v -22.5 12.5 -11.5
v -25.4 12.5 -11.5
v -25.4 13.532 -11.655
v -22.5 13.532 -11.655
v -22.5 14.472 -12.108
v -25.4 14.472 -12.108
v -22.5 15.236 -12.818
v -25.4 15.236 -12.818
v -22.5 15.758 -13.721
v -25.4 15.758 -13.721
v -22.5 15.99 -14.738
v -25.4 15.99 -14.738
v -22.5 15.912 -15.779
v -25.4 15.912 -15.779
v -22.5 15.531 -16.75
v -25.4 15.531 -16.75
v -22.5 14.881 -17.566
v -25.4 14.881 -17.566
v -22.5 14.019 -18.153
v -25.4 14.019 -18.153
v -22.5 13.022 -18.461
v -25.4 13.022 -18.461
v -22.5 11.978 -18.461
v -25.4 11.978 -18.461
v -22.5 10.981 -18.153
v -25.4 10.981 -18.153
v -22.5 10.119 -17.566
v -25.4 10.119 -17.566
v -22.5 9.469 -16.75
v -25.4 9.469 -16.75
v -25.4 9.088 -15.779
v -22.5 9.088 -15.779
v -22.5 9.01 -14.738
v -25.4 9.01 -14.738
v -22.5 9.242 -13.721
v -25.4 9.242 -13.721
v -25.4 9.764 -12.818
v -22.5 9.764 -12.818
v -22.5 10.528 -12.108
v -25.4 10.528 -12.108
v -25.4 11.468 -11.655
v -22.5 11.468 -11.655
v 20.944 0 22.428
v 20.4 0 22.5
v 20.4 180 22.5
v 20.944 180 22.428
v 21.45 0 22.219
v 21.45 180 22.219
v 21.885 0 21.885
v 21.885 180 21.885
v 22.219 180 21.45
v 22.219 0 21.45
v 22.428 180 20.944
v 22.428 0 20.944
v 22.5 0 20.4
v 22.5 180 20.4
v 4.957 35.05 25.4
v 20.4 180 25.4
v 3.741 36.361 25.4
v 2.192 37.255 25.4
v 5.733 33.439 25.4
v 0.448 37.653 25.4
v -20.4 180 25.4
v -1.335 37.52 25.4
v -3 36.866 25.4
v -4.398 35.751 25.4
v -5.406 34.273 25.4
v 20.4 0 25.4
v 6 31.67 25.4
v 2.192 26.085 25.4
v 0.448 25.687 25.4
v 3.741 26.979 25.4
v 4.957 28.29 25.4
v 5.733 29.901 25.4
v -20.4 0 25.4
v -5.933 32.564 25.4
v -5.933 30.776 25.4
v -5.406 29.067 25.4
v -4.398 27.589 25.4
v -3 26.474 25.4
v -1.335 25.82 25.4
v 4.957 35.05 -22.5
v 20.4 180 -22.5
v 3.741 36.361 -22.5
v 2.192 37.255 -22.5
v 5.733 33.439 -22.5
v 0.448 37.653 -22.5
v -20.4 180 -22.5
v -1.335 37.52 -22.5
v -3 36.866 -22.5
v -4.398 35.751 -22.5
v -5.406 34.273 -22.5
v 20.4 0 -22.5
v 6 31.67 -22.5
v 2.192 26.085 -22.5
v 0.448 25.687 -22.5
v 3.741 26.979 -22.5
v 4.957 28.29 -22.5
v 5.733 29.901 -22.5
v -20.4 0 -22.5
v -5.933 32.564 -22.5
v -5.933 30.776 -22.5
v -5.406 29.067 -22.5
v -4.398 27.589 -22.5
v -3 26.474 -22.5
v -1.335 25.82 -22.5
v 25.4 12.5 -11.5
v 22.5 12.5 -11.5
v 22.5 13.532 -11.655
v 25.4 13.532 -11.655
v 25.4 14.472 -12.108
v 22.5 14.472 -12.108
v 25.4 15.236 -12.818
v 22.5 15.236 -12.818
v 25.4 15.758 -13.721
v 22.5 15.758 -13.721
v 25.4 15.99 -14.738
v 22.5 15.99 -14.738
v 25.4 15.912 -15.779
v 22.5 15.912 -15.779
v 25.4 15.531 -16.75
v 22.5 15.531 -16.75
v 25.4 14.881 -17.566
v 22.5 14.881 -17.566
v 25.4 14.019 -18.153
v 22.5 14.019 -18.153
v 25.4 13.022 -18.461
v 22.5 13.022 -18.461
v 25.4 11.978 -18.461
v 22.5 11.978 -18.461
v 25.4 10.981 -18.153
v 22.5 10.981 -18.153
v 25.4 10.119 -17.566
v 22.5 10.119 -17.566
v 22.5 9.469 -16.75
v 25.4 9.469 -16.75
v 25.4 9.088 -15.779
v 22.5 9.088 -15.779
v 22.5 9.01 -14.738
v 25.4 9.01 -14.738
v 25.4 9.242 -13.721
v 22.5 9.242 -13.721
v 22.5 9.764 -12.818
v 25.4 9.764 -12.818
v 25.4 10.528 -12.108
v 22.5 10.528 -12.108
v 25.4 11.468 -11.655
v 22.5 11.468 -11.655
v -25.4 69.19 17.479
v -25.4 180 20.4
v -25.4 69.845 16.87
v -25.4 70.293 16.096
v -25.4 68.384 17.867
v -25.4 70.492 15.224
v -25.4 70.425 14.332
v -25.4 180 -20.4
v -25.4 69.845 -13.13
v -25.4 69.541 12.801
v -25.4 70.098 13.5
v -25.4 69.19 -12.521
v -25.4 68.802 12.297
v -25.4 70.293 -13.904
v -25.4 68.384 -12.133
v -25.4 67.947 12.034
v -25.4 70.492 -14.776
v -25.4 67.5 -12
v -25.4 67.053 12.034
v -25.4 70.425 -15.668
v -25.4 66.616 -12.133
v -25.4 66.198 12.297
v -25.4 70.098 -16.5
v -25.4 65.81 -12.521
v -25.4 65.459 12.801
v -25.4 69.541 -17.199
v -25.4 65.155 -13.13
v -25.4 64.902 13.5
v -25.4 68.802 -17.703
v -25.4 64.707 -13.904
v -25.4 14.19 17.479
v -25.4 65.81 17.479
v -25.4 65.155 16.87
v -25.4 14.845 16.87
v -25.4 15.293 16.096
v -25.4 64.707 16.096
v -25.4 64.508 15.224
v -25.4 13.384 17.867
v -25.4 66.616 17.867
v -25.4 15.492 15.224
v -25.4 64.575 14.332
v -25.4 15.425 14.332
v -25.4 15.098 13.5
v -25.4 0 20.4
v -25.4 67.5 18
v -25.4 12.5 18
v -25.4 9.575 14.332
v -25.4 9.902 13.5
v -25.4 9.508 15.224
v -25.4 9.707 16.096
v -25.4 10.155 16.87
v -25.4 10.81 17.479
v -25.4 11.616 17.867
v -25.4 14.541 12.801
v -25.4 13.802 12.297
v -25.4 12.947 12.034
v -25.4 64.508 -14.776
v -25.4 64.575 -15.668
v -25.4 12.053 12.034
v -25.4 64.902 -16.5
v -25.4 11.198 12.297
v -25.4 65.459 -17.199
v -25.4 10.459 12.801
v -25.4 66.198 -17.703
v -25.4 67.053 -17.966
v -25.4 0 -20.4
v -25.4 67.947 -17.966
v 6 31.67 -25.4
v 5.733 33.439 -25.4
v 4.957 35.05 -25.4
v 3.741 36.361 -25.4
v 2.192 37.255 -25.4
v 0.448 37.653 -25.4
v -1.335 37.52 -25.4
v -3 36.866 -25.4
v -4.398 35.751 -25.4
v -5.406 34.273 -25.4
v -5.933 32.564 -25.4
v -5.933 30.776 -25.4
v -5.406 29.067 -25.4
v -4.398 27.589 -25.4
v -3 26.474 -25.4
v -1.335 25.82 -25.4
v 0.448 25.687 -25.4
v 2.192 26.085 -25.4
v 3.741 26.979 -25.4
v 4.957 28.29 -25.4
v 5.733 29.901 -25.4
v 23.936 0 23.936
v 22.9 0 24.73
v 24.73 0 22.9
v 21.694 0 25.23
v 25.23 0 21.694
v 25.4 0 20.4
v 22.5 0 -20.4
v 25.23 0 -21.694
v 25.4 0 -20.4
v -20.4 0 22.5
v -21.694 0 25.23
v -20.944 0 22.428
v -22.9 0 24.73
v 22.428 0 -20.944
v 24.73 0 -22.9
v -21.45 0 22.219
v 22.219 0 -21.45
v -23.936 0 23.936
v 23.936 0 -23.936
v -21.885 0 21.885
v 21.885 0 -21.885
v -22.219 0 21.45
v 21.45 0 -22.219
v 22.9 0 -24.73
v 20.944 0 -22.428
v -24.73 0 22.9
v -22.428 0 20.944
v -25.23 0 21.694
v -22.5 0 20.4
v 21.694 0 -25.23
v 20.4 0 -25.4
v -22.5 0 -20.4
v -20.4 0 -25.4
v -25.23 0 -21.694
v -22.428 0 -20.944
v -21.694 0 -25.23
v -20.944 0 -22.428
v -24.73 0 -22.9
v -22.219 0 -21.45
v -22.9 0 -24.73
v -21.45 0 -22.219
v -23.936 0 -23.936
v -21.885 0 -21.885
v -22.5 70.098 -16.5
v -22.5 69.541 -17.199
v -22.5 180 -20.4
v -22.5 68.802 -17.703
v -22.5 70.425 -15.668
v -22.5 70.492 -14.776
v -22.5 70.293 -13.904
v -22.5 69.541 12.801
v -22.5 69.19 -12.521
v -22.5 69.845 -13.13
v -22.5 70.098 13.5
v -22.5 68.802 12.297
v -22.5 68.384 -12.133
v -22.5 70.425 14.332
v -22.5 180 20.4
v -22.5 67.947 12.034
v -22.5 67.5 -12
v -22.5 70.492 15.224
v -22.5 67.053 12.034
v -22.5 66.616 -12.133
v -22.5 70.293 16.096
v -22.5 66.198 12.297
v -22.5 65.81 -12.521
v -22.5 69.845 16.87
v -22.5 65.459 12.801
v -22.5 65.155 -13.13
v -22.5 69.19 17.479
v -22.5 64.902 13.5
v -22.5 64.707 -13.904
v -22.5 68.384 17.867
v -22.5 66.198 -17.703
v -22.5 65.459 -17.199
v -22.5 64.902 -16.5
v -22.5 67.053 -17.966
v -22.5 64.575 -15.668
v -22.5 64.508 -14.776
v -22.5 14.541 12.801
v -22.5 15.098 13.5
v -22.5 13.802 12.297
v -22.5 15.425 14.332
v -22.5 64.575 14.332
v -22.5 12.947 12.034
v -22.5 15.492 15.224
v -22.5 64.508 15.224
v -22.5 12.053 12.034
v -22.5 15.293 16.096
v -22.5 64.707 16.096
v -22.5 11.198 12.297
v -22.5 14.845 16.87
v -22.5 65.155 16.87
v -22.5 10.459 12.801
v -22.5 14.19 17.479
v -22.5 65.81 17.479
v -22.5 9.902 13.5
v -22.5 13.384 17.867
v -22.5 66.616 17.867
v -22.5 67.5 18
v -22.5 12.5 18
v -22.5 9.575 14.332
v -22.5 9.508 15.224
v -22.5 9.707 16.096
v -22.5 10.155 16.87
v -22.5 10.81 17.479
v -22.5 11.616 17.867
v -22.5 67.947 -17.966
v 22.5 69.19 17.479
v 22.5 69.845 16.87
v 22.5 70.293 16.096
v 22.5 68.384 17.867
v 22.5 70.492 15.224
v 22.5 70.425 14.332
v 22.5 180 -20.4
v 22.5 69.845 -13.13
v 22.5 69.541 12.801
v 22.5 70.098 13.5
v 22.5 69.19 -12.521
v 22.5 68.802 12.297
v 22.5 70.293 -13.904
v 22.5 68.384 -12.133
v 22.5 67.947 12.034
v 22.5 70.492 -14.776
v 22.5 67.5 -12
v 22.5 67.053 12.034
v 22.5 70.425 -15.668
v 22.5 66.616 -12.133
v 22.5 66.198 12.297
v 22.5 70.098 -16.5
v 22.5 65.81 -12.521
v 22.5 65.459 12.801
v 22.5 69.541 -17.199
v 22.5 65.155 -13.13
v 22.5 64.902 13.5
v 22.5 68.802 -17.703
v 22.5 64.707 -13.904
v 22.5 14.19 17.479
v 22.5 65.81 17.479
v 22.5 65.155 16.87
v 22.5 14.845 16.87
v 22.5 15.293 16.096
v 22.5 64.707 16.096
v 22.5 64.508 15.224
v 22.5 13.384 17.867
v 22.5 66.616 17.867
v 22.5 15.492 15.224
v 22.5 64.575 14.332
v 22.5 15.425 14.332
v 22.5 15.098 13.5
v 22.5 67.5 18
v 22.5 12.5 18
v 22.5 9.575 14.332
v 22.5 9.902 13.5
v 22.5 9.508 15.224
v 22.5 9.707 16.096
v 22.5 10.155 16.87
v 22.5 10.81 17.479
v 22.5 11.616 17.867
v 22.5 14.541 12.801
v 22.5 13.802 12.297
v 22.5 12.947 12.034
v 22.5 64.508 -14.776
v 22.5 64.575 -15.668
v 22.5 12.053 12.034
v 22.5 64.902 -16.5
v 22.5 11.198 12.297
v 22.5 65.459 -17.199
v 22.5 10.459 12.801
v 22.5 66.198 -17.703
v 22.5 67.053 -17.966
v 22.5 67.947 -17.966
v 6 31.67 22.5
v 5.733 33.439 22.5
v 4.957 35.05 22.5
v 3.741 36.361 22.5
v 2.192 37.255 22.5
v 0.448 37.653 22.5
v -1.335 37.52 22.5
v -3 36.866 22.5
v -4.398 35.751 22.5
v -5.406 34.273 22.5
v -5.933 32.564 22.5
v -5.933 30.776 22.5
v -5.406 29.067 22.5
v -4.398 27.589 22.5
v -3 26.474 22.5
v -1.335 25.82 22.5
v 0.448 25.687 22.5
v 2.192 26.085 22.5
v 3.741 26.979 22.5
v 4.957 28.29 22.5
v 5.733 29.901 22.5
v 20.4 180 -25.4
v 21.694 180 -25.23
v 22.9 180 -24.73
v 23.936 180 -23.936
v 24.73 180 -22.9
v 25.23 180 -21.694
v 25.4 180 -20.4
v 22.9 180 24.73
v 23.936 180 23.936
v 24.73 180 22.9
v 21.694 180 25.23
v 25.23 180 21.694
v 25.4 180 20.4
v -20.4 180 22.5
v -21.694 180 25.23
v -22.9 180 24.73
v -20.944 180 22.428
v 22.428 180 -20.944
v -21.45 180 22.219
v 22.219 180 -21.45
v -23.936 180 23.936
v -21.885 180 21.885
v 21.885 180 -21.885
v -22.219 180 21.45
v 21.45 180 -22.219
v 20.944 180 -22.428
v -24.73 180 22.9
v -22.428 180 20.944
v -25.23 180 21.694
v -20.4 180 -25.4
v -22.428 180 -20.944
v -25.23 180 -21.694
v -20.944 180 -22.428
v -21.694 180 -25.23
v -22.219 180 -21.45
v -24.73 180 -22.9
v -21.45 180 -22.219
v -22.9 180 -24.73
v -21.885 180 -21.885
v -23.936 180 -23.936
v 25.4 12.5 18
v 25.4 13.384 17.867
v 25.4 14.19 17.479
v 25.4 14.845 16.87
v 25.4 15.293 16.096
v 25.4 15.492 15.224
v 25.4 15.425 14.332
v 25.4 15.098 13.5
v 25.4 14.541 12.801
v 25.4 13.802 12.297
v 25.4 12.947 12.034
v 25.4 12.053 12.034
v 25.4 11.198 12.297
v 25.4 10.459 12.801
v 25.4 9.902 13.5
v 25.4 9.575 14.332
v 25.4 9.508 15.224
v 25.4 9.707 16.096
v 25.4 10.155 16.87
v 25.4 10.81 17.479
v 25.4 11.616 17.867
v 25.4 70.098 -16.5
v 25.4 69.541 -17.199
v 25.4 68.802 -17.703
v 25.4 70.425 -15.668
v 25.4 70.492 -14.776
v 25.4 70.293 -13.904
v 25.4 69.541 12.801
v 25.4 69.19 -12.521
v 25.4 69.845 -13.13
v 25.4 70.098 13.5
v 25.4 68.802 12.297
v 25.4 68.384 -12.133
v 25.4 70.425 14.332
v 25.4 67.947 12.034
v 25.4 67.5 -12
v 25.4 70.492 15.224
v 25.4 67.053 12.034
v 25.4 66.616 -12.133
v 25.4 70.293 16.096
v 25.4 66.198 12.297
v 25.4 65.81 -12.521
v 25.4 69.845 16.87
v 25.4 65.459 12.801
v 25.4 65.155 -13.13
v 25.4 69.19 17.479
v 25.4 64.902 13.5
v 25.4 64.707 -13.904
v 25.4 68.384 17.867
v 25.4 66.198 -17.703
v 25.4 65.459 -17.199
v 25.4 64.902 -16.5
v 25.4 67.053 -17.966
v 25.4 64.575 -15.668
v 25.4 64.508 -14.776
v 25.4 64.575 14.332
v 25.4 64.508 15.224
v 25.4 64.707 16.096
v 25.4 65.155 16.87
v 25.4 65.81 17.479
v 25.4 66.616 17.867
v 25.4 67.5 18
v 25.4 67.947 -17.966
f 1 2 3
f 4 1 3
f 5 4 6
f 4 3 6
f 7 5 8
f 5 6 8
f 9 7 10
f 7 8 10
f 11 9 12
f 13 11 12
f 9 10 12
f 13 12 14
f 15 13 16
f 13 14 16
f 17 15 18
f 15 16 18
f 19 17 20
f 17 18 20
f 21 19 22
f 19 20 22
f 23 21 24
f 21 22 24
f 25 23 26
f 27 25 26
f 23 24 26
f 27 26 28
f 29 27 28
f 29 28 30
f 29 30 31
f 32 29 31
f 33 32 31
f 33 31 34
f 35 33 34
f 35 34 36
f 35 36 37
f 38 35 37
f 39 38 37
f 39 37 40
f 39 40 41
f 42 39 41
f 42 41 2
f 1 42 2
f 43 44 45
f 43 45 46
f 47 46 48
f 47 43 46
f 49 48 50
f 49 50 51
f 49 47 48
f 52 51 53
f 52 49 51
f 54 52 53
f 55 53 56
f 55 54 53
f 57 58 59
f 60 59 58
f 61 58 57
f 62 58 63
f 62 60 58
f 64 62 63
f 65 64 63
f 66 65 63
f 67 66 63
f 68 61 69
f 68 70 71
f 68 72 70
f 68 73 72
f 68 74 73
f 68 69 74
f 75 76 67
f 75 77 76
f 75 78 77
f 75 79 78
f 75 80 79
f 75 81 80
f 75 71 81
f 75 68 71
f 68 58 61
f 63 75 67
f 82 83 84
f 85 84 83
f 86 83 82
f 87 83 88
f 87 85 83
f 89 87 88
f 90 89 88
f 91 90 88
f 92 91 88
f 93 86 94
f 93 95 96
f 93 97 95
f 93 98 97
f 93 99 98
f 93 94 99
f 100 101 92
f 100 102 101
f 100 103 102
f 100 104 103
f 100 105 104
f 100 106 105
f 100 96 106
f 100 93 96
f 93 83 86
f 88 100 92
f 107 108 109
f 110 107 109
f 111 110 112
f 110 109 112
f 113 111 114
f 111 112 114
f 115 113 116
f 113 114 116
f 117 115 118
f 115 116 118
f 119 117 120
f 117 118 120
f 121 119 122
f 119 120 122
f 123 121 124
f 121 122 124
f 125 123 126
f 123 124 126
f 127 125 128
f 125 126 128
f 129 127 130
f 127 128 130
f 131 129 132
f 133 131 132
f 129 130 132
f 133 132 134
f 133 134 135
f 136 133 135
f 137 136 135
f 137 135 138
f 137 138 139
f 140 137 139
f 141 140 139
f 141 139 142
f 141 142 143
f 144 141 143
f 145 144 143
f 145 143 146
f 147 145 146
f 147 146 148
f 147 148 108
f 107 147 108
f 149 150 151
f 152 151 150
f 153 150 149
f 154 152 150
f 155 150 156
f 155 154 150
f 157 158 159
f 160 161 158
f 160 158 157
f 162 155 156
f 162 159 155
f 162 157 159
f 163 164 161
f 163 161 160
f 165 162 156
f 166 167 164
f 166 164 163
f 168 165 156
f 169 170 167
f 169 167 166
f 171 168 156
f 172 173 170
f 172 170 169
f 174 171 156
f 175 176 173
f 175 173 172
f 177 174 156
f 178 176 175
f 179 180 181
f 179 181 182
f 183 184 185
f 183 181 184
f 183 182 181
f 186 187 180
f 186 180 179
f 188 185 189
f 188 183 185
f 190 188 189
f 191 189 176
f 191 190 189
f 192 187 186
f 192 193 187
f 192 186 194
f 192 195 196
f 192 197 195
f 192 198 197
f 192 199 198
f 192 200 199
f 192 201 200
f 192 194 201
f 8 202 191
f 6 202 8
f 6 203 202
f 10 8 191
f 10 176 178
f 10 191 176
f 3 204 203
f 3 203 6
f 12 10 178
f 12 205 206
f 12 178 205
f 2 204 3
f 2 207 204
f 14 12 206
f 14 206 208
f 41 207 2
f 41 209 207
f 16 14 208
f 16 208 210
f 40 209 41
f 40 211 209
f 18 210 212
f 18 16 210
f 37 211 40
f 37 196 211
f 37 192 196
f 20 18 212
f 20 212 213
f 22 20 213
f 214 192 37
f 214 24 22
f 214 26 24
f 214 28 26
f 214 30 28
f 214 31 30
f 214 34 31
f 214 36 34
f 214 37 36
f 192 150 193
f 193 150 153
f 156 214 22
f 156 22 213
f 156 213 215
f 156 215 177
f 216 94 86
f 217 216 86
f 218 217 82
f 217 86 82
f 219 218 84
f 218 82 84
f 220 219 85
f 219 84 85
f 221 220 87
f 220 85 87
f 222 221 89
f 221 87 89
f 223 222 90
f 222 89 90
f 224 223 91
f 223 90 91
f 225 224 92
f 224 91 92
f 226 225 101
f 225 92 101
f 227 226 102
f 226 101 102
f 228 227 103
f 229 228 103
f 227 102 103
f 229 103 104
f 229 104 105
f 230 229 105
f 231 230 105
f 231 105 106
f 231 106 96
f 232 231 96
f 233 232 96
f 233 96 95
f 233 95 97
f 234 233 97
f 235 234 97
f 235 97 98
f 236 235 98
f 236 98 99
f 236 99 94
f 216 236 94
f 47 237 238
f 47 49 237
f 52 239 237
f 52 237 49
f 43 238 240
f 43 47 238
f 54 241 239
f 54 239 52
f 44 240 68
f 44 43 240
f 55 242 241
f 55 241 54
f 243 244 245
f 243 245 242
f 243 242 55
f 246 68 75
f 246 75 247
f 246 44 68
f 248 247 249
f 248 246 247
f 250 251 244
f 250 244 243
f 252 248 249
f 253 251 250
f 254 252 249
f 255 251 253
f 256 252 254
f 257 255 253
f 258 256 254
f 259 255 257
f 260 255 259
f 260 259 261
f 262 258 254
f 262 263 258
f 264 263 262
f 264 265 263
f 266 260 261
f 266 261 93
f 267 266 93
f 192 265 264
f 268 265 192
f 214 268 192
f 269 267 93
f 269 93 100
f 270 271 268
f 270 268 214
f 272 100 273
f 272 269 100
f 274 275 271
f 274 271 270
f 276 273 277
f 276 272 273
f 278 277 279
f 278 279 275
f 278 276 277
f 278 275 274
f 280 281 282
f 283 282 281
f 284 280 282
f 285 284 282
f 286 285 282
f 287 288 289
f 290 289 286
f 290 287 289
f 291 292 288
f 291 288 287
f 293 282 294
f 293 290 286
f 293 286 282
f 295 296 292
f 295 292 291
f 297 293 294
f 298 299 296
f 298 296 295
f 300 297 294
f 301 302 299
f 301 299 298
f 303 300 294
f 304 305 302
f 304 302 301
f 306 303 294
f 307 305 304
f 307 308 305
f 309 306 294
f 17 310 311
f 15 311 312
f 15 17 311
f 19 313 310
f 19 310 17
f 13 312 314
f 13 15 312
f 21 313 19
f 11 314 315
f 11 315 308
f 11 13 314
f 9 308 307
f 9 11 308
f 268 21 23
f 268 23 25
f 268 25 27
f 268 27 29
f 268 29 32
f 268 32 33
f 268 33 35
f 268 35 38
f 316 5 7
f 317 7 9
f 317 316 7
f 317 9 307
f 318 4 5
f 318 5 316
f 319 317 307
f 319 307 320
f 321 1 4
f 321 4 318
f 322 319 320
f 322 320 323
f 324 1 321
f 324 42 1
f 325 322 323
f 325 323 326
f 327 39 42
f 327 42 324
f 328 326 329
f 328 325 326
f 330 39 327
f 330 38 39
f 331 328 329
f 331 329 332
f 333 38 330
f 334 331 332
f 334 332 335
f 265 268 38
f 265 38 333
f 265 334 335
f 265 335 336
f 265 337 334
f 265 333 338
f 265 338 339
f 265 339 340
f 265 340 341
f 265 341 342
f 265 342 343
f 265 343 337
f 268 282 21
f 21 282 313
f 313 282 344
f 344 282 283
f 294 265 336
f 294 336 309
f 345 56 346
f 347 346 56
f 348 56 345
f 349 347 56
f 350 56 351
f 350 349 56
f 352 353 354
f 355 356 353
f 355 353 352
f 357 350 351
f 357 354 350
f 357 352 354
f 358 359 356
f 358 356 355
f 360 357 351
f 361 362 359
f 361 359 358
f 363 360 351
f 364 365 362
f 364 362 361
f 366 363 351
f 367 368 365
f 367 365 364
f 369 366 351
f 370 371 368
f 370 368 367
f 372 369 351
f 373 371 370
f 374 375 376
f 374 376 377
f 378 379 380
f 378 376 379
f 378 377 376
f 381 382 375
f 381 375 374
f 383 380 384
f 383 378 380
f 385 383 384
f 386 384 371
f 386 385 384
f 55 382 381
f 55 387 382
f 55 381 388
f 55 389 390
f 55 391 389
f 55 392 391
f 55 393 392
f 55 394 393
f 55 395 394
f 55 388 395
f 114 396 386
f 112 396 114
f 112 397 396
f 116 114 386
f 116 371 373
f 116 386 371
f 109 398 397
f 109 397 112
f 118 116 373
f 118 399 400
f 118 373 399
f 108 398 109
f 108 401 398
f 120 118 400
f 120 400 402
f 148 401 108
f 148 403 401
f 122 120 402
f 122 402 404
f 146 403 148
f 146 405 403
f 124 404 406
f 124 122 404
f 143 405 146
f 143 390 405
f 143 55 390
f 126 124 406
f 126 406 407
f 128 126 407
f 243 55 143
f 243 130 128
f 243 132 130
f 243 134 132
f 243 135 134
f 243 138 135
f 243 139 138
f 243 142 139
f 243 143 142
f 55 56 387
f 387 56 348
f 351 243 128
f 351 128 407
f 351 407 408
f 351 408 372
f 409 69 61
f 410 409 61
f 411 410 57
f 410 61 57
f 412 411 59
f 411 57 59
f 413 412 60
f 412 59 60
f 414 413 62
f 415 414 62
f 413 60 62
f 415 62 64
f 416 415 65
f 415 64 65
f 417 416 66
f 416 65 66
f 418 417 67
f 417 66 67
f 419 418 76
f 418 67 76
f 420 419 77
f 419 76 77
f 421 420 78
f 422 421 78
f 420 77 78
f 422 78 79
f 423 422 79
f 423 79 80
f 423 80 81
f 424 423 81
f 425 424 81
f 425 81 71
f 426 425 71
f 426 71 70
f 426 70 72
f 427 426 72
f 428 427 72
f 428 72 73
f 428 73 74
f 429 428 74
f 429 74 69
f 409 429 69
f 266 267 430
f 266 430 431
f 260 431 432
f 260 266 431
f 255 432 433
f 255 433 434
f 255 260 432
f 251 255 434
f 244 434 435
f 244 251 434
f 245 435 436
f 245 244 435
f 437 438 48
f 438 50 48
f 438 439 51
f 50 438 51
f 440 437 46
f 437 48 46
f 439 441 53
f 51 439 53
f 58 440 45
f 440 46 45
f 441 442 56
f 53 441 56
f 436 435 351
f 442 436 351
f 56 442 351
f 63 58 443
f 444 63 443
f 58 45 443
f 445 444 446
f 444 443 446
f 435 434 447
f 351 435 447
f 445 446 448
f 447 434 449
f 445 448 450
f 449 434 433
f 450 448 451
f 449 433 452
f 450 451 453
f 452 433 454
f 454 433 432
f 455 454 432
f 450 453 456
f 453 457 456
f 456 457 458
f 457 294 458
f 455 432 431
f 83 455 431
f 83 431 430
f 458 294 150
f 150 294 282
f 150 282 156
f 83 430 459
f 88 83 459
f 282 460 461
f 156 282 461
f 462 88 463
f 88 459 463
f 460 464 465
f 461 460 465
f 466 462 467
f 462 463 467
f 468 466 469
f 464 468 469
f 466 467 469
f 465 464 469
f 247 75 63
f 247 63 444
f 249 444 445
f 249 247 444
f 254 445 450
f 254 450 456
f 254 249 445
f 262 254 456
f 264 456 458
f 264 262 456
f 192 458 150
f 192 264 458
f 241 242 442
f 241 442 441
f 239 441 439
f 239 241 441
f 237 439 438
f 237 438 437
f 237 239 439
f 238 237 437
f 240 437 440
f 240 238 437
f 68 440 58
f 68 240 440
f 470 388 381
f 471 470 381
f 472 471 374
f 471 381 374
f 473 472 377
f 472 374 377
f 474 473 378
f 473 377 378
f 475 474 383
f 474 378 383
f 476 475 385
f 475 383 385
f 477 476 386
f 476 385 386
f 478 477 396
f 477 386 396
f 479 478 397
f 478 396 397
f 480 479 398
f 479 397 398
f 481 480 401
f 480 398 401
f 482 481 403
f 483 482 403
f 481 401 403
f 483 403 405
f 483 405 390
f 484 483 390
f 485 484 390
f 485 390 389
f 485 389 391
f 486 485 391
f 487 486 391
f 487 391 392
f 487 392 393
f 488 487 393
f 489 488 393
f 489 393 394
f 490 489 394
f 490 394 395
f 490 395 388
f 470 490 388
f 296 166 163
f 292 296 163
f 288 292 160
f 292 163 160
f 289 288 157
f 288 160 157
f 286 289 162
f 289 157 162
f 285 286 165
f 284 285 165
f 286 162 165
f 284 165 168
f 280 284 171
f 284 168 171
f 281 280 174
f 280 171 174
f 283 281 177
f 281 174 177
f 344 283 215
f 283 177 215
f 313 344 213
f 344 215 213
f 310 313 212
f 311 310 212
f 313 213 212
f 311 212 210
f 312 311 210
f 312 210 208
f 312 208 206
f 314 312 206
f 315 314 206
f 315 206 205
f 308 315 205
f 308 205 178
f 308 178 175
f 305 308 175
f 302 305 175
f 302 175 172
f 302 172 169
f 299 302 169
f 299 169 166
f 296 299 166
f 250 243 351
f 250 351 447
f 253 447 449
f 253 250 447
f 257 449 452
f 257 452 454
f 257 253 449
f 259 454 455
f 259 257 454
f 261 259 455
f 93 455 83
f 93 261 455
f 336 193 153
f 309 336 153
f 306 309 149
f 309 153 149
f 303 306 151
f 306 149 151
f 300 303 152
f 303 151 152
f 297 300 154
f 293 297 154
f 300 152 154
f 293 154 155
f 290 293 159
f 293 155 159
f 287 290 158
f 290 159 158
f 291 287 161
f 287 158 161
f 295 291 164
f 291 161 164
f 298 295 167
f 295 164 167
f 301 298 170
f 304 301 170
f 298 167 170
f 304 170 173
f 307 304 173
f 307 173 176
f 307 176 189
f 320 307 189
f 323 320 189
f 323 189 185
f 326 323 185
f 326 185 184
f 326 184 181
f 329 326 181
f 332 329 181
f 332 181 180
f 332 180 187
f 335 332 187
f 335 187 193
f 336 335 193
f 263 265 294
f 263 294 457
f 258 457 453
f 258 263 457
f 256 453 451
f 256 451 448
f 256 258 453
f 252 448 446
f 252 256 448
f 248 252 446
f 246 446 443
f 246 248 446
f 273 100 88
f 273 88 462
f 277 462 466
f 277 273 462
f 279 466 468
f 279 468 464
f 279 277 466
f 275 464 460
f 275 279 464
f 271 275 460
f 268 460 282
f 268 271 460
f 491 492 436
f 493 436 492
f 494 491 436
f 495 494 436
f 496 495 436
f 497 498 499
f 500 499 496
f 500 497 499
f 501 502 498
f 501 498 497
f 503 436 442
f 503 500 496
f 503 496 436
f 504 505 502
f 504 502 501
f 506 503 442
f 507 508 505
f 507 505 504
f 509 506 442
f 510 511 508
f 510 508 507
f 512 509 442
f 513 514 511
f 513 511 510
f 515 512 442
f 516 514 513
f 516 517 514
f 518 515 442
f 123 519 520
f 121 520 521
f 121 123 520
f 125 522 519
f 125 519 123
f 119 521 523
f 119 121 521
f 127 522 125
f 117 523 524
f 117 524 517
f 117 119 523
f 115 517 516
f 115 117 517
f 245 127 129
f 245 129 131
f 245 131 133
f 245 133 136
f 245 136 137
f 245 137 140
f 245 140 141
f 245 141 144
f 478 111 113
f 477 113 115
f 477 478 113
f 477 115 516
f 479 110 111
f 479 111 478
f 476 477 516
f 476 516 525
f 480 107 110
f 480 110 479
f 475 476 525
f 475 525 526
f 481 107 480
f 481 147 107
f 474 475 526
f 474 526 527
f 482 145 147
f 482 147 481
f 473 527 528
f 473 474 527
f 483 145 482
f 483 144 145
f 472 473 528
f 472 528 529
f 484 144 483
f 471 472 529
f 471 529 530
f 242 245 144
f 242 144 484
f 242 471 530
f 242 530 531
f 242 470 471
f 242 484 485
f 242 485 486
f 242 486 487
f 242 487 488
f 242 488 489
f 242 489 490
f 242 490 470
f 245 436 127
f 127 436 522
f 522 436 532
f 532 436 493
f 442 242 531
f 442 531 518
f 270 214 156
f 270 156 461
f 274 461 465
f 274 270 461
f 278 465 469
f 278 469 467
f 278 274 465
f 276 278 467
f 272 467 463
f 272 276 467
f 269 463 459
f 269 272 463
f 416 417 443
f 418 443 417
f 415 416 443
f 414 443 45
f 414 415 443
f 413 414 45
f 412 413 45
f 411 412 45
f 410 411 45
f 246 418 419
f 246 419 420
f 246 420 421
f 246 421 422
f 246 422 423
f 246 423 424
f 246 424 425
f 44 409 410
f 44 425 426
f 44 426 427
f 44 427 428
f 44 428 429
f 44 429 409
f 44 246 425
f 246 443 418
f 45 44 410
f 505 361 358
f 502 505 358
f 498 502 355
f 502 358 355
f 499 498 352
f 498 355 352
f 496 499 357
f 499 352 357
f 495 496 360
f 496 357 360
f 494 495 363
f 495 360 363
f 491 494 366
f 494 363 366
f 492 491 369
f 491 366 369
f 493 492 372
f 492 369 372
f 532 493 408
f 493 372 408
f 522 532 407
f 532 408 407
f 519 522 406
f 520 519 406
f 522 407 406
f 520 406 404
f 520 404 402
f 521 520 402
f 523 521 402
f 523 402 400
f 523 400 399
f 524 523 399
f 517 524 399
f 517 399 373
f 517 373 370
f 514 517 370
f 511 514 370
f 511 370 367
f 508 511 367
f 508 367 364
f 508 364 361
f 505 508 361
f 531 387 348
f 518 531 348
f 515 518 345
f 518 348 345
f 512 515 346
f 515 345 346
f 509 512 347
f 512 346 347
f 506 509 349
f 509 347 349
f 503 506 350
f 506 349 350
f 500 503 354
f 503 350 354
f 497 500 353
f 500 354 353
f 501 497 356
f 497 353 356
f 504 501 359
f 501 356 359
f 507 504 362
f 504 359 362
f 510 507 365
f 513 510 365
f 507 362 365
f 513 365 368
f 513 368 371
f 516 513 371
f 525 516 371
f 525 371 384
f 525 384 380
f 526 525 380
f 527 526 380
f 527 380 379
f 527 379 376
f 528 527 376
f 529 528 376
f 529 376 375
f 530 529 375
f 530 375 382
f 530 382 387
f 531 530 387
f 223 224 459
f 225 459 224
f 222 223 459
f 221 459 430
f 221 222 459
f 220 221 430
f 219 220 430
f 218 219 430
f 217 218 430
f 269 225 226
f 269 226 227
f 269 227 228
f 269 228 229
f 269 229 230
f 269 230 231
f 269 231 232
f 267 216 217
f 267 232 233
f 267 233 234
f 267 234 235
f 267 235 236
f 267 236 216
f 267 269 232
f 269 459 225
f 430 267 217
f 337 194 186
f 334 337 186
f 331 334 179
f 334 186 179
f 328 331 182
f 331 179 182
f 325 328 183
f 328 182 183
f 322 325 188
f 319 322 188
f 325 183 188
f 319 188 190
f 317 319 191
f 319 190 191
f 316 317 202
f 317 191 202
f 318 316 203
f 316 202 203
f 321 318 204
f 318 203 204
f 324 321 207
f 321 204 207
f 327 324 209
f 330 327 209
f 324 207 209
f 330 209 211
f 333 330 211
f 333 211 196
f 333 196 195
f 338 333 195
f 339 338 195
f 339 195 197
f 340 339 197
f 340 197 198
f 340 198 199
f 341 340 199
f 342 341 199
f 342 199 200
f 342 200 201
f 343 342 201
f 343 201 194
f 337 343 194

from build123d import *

# Parameters (mm, degrees)
BOSS_EXTRUDE1_DEPTH = 180
SKETCH3_R           = 3
SKETCH3_R_2         = 3.5
CUT_EXTRUDE1_DEPTH  = 95
SKETCH4_R           = 6
CUT_EXTRUDE2_DEPTH  = 95


with BuildPart() as part:
    # Sketch1 → Boss-Extrude1 (new body)
    with BuildSketch(Plane(origin=(0, 0, 0), x_dir=(1, 0, 0), z_dir=(0, 1, 0))):
        with BuildLine():
            Line((-20.4, 25.4), (20.4, 25.4))
            ThreePointArc((20.4, 25.4), (23.935533906, 23.935533906), (25.4, 20.4))
            Line((25.4, 20.4), (25.4, -20.4))
            ThreePointArc((25.4, -20.4), (23.935533906, -23.935533906), (20.4, -25.4))
            Line((20.4, -25.4), (-20.4, -25.4))
            ThreePointArc((-20.4, -25.4), (-23.935533906, -23.935533906), (-25.4, -20.4))
            Line((-25.4, -20.4), (-25.4, 20.4))
            ThreePointArc((-25.4, 20.4), (-23.935533906, 23.935533906), (-20.4, 25.4))
        make_face()
        with BuildLine():
            Line((-22.5, 20.4), (-22.5, -20.4))
            ThreePointArc((-22.5, -20.4), (-21.88492424, -21.88492424), (-20.4, -22.5))
            Line((-20.4, -22.5), (20.4, -22.5))
            ThreePointArc((20.4, -22.5), (21.88492424, -21.88492424), (22.5, -20.4))
            Line((22.5, -20.4), (22.5, 20.4))
            ThreePointArc((22.5, 20.4), (21.88492424, 21.88492424), (20.4, 22.5))
            Line((20.4, 22.5), (-20.4, 22.5))
            ThreePointArc((-20.4, 22.5), (-21.88492424, 21.88492424), (-22.5, 20.4))
        make_face(mode=Mode.SUBTRACT)
    extrude(amount=BOSS_EXTRUDE1_DEPTH)

    # Sketch3 → Cut-Extrude1 (cut)
    with BuildSketch(Plane.ZY.offset(25.4)):
        with Locations((-15, 67.5)):
            Circle(SKETCH3_R)
        with Locations((15, 67.5)):
            Circle(SKETCH3_R)
        with Locations((-15, 12.5)):
            Circle(SKETCH3_R_2)
        with Locations((15, 12.5)):
            Circle(SKETCH3_R)
    extrude(amount=-CUT_EXTRUDE1_DEPTH, mode=Mode.SUBTRACT)

    # Sketch4 → Cut-Extrude2 (cut)
    with BuildSketch(Plane.XY.offset(25.4)):
        with Locations((0, 31.67)):
            Circle(SKETCH4_R)
    extrude(amount=-CUT_EXTRUDE2_DEPTH, mode=Mode.SUBTRACT)


solid = part.part
